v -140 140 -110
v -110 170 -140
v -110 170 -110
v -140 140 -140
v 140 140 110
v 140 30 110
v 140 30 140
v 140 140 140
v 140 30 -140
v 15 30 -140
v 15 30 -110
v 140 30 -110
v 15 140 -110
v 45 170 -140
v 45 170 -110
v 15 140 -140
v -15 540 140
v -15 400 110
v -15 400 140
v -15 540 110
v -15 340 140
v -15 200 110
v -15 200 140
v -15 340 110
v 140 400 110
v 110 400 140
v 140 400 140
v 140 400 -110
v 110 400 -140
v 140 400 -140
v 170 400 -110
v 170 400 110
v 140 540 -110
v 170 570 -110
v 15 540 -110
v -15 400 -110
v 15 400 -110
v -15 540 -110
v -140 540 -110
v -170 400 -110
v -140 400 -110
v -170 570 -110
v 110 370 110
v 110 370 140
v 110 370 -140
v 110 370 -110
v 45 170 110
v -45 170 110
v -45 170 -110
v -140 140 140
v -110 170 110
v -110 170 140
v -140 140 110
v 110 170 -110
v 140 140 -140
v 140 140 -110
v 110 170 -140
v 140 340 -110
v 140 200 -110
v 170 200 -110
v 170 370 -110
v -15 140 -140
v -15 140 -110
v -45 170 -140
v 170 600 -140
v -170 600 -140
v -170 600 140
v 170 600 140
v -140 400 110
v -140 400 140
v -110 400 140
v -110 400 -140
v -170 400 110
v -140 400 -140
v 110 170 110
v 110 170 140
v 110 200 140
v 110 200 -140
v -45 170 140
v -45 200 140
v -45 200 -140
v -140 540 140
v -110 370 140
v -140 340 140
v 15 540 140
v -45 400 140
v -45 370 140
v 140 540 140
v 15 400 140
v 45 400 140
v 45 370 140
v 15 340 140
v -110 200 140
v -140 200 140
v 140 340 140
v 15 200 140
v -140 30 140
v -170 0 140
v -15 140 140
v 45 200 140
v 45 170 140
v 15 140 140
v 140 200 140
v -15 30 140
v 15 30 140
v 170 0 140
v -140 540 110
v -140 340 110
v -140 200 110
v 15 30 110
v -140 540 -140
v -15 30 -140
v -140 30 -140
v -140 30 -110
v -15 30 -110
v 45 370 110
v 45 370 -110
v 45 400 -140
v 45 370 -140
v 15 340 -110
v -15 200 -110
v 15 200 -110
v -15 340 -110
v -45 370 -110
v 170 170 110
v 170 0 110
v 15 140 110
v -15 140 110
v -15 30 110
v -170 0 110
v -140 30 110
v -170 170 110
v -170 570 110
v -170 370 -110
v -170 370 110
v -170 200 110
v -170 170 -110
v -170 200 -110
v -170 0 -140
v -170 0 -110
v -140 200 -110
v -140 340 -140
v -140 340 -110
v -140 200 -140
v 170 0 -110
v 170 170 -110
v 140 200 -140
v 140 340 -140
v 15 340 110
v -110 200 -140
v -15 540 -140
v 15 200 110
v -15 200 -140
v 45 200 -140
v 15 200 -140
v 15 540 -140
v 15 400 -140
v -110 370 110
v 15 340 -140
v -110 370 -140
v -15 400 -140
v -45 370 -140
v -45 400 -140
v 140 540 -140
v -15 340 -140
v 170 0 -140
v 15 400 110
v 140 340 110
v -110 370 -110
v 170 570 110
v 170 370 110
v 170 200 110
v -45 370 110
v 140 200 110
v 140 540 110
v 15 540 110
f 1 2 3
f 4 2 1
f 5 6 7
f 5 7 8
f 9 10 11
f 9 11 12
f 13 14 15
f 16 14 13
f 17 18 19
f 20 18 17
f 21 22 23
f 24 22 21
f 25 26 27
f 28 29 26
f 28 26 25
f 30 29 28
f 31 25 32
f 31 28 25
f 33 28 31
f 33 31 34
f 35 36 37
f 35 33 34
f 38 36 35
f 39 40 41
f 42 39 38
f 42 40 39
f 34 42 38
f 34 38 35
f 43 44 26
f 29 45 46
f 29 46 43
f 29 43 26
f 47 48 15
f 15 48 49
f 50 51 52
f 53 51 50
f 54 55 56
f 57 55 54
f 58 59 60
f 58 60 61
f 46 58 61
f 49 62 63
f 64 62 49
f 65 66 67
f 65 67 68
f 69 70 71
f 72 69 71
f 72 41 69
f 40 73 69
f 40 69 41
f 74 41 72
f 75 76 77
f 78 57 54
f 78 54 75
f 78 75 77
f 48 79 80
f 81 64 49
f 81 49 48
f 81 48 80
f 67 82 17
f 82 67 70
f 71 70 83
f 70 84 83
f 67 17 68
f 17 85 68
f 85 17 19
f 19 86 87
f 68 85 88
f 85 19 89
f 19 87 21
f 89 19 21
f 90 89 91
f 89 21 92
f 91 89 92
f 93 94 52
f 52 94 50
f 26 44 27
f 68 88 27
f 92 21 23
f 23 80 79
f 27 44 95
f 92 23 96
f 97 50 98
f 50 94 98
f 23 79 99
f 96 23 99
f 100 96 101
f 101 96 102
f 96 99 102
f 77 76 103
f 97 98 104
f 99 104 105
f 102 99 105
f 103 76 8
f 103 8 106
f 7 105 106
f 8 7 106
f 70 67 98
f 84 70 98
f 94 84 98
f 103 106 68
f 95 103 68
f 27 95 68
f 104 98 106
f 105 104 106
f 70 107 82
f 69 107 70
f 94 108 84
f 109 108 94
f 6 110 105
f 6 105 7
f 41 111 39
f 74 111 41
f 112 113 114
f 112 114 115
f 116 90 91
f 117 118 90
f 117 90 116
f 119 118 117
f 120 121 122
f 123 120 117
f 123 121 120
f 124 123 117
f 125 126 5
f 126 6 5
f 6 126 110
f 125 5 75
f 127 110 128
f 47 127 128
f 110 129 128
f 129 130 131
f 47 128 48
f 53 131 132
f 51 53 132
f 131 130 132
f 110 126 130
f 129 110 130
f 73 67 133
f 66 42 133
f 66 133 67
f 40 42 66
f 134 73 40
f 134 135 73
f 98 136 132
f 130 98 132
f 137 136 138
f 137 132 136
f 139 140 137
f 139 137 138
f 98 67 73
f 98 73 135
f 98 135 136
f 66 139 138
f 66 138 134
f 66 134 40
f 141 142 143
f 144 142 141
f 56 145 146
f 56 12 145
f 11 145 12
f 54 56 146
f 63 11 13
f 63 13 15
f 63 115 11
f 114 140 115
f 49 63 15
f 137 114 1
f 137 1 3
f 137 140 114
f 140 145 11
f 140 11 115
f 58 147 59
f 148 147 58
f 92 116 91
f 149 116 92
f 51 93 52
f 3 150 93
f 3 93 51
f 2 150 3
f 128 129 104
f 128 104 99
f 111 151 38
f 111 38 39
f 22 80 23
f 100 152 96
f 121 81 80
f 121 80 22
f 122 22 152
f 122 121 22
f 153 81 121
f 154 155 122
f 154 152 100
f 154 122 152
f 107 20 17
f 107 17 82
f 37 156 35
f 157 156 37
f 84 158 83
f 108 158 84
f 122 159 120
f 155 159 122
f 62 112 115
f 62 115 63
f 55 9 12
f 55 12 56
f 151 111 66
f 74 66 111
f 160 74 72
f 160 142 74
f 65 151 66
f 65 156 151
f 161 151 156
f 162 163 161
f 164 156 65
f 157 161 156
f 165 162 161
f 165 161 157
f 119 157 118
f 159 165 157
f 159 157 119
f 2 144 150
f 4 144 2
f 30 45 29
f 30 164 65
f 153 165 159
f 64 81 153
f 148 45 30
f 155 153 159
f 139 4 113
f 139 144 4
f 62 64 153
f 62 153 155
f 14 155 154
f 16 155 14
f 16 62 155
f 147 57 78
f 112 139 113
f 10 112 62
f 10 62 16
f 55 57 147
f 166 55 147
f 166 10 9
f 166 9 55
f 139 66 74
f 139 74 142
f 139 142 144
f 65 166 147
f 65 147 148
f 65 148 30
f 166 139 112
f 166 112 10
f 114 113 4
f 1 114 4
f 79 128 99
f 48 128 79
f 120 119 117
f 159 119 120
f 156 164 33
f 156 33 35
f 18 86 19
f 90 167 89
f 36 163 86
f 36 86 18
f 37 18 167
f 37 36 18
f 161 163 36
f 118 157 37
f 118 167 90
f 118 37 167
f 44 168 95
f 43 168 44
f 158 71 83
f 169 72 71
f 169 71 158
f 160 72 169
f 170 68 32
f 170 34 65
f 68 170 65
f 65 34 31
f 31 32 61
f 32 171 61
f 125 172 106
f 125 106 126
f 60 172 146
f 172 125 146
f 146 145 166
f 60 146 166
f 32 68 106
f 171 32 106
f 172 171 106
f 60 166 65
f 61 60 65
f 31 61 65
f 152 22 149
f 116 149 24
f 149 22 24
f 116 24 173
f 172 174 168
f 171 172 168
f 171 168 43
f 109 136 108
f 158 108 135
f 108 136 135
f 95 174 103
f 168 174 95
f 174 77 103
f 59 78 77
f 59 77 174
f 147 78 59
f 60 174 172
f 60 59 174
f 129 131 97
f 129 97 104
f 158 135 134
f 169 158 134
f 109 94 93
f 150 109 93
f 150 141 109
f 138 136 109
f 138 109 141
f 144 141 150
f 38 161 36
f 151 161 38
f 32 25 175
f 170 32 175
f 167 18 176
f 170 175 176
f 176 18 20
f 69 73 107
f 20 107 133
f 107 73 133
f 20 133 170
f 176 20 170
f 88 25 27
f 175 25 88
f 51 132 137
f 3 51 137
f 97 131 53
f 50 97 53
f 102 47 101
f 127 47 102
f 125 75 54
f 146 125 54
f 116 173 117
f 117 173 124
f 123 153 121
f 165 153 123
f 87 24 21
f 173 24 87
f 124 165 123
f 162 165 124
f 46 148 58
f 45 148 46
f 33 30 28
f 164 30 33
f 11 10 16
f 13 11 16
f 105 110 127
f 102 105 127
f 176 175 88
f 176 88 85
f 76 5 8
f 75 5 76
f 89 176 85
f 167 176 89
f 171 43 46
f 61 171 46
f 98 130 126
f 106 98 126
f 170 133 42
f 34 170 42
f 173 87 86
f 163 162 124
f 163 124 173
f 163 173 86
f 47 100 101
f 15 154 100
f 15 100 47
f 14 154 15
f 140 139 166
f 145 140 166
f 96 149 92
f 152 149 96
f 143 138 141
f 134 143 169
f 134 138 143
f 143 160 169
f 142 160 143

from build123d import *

# Parameters (mm, degrees)
SKETCH1_W               = 340
SKETCH1_H               = 280
BOSS_EXTRUDE1_DEPTH     = 600
CUT_EXTRUDE1_DEPTH      = 704.70448343
CUT_EXTRUDE1_DEPTH_BACK = 704.70448343
SKETCH4_W               = 220
SKETCH4_H               = 170
CUT_EXTRUDE3_DEPTH      = 684.593446429
CUT_EXTRUDE3_DEPTH_BACK = 684.593446429
SKETCH6_W               = 125
SKETCH6_H               = 110


with BuildPart() as part:
    # Sketch1 → Boss-Extrude1 (new body)
    with BuildSketch(Plane(origin=(0, 0, 0), x_dir=(1, 0, 0), z_dir=(0, 1, 0))):
        Rectangle(SKETCH1_W, SKETCH1_H)
    extrude(amount=BOSS_EXTRUDE1_DEPTH)

    # Sketch4 → Cut-Extrude1 (cut, two sides: drawn at the far end of the back side and taken through both)
    with BuildSketch(Plane(origin=(170, 0, 0), x_dir=(0, 0, -1), z_dir=(1, 0, 0)).offset(-CUT_EXTRUDE1_DEPTH_BACK)):
        with Locations((0, 485)):
            Rectangle(SKETCH4_W, SKETCH4_H)
        with Locations((0, 285)):
            Rectangle(SKETCH4_W, SKETCH4_H)
        with Locations((0, 85)):
            Rectangle(SKETCH4_W, SKETCH4_H)
    extrude(amount=CUT_EXTRUDE1_DEPTH + CUT_EXTRUDE1_DEPTH_BACK, mode=Mode.SUBTRACT)

    # Sketch6 → Cut-Extrude3 (cut, two sides: drawn at the far end of the back side and taken through both)
    with BuildSketch(Plane.XY.offset(140).offset(-CUT_EXTRUDE3_DEPTH_BACK)):
        Polygon((-15, 540), (-140, 540), (-140, 400), (-110, 400), (-110, 370), (-45, 370), (-45, 400), (-15, 400), align=None)
        Polygon((140, 540), (15, 540), (15, 400), (45, 400), (45, 370), (110, 370), (110, 400), (140, 400), align=None)
        Polygon((140, 340), (15, 340), (15, 200), (45, 200), (45, 170), (110, 170), (110, 200), (140, 200), align=None)
        Polygon((-15, 340), (-140, 340), (-140, 200), (-110, 200), (-110, 170), (-45, 170), (-45, 200), (-15, 200), align=None)
        with Locations((-77.5, 85)):
            Rectangle(SKETCH6_W, SKETCH6_H)
        with Locations((77.5, 85)):
            Rectangle(SKETCH6_W, SKETCH6_H)
        Polygon((-45, 170), (-110, 170), (-140, 140), (-15, 140), align=None)
        Polygon((110, 170), (45, 170), (15, 140), (140, 140), align=None)
        Polygon((110, 370), (45, 370), (15, 340), (140, 340), align=None)
        Polygon((-45, 370), (-110, 370), (-140, 340), (-15, 340), align=None)
    extrude(amount=CUT_EXTRUDE3_DEPTH + CUT_EXTRUDE3_DEPTH_BACK, mode=Mode.SUBTRACT)


solid = part.part
